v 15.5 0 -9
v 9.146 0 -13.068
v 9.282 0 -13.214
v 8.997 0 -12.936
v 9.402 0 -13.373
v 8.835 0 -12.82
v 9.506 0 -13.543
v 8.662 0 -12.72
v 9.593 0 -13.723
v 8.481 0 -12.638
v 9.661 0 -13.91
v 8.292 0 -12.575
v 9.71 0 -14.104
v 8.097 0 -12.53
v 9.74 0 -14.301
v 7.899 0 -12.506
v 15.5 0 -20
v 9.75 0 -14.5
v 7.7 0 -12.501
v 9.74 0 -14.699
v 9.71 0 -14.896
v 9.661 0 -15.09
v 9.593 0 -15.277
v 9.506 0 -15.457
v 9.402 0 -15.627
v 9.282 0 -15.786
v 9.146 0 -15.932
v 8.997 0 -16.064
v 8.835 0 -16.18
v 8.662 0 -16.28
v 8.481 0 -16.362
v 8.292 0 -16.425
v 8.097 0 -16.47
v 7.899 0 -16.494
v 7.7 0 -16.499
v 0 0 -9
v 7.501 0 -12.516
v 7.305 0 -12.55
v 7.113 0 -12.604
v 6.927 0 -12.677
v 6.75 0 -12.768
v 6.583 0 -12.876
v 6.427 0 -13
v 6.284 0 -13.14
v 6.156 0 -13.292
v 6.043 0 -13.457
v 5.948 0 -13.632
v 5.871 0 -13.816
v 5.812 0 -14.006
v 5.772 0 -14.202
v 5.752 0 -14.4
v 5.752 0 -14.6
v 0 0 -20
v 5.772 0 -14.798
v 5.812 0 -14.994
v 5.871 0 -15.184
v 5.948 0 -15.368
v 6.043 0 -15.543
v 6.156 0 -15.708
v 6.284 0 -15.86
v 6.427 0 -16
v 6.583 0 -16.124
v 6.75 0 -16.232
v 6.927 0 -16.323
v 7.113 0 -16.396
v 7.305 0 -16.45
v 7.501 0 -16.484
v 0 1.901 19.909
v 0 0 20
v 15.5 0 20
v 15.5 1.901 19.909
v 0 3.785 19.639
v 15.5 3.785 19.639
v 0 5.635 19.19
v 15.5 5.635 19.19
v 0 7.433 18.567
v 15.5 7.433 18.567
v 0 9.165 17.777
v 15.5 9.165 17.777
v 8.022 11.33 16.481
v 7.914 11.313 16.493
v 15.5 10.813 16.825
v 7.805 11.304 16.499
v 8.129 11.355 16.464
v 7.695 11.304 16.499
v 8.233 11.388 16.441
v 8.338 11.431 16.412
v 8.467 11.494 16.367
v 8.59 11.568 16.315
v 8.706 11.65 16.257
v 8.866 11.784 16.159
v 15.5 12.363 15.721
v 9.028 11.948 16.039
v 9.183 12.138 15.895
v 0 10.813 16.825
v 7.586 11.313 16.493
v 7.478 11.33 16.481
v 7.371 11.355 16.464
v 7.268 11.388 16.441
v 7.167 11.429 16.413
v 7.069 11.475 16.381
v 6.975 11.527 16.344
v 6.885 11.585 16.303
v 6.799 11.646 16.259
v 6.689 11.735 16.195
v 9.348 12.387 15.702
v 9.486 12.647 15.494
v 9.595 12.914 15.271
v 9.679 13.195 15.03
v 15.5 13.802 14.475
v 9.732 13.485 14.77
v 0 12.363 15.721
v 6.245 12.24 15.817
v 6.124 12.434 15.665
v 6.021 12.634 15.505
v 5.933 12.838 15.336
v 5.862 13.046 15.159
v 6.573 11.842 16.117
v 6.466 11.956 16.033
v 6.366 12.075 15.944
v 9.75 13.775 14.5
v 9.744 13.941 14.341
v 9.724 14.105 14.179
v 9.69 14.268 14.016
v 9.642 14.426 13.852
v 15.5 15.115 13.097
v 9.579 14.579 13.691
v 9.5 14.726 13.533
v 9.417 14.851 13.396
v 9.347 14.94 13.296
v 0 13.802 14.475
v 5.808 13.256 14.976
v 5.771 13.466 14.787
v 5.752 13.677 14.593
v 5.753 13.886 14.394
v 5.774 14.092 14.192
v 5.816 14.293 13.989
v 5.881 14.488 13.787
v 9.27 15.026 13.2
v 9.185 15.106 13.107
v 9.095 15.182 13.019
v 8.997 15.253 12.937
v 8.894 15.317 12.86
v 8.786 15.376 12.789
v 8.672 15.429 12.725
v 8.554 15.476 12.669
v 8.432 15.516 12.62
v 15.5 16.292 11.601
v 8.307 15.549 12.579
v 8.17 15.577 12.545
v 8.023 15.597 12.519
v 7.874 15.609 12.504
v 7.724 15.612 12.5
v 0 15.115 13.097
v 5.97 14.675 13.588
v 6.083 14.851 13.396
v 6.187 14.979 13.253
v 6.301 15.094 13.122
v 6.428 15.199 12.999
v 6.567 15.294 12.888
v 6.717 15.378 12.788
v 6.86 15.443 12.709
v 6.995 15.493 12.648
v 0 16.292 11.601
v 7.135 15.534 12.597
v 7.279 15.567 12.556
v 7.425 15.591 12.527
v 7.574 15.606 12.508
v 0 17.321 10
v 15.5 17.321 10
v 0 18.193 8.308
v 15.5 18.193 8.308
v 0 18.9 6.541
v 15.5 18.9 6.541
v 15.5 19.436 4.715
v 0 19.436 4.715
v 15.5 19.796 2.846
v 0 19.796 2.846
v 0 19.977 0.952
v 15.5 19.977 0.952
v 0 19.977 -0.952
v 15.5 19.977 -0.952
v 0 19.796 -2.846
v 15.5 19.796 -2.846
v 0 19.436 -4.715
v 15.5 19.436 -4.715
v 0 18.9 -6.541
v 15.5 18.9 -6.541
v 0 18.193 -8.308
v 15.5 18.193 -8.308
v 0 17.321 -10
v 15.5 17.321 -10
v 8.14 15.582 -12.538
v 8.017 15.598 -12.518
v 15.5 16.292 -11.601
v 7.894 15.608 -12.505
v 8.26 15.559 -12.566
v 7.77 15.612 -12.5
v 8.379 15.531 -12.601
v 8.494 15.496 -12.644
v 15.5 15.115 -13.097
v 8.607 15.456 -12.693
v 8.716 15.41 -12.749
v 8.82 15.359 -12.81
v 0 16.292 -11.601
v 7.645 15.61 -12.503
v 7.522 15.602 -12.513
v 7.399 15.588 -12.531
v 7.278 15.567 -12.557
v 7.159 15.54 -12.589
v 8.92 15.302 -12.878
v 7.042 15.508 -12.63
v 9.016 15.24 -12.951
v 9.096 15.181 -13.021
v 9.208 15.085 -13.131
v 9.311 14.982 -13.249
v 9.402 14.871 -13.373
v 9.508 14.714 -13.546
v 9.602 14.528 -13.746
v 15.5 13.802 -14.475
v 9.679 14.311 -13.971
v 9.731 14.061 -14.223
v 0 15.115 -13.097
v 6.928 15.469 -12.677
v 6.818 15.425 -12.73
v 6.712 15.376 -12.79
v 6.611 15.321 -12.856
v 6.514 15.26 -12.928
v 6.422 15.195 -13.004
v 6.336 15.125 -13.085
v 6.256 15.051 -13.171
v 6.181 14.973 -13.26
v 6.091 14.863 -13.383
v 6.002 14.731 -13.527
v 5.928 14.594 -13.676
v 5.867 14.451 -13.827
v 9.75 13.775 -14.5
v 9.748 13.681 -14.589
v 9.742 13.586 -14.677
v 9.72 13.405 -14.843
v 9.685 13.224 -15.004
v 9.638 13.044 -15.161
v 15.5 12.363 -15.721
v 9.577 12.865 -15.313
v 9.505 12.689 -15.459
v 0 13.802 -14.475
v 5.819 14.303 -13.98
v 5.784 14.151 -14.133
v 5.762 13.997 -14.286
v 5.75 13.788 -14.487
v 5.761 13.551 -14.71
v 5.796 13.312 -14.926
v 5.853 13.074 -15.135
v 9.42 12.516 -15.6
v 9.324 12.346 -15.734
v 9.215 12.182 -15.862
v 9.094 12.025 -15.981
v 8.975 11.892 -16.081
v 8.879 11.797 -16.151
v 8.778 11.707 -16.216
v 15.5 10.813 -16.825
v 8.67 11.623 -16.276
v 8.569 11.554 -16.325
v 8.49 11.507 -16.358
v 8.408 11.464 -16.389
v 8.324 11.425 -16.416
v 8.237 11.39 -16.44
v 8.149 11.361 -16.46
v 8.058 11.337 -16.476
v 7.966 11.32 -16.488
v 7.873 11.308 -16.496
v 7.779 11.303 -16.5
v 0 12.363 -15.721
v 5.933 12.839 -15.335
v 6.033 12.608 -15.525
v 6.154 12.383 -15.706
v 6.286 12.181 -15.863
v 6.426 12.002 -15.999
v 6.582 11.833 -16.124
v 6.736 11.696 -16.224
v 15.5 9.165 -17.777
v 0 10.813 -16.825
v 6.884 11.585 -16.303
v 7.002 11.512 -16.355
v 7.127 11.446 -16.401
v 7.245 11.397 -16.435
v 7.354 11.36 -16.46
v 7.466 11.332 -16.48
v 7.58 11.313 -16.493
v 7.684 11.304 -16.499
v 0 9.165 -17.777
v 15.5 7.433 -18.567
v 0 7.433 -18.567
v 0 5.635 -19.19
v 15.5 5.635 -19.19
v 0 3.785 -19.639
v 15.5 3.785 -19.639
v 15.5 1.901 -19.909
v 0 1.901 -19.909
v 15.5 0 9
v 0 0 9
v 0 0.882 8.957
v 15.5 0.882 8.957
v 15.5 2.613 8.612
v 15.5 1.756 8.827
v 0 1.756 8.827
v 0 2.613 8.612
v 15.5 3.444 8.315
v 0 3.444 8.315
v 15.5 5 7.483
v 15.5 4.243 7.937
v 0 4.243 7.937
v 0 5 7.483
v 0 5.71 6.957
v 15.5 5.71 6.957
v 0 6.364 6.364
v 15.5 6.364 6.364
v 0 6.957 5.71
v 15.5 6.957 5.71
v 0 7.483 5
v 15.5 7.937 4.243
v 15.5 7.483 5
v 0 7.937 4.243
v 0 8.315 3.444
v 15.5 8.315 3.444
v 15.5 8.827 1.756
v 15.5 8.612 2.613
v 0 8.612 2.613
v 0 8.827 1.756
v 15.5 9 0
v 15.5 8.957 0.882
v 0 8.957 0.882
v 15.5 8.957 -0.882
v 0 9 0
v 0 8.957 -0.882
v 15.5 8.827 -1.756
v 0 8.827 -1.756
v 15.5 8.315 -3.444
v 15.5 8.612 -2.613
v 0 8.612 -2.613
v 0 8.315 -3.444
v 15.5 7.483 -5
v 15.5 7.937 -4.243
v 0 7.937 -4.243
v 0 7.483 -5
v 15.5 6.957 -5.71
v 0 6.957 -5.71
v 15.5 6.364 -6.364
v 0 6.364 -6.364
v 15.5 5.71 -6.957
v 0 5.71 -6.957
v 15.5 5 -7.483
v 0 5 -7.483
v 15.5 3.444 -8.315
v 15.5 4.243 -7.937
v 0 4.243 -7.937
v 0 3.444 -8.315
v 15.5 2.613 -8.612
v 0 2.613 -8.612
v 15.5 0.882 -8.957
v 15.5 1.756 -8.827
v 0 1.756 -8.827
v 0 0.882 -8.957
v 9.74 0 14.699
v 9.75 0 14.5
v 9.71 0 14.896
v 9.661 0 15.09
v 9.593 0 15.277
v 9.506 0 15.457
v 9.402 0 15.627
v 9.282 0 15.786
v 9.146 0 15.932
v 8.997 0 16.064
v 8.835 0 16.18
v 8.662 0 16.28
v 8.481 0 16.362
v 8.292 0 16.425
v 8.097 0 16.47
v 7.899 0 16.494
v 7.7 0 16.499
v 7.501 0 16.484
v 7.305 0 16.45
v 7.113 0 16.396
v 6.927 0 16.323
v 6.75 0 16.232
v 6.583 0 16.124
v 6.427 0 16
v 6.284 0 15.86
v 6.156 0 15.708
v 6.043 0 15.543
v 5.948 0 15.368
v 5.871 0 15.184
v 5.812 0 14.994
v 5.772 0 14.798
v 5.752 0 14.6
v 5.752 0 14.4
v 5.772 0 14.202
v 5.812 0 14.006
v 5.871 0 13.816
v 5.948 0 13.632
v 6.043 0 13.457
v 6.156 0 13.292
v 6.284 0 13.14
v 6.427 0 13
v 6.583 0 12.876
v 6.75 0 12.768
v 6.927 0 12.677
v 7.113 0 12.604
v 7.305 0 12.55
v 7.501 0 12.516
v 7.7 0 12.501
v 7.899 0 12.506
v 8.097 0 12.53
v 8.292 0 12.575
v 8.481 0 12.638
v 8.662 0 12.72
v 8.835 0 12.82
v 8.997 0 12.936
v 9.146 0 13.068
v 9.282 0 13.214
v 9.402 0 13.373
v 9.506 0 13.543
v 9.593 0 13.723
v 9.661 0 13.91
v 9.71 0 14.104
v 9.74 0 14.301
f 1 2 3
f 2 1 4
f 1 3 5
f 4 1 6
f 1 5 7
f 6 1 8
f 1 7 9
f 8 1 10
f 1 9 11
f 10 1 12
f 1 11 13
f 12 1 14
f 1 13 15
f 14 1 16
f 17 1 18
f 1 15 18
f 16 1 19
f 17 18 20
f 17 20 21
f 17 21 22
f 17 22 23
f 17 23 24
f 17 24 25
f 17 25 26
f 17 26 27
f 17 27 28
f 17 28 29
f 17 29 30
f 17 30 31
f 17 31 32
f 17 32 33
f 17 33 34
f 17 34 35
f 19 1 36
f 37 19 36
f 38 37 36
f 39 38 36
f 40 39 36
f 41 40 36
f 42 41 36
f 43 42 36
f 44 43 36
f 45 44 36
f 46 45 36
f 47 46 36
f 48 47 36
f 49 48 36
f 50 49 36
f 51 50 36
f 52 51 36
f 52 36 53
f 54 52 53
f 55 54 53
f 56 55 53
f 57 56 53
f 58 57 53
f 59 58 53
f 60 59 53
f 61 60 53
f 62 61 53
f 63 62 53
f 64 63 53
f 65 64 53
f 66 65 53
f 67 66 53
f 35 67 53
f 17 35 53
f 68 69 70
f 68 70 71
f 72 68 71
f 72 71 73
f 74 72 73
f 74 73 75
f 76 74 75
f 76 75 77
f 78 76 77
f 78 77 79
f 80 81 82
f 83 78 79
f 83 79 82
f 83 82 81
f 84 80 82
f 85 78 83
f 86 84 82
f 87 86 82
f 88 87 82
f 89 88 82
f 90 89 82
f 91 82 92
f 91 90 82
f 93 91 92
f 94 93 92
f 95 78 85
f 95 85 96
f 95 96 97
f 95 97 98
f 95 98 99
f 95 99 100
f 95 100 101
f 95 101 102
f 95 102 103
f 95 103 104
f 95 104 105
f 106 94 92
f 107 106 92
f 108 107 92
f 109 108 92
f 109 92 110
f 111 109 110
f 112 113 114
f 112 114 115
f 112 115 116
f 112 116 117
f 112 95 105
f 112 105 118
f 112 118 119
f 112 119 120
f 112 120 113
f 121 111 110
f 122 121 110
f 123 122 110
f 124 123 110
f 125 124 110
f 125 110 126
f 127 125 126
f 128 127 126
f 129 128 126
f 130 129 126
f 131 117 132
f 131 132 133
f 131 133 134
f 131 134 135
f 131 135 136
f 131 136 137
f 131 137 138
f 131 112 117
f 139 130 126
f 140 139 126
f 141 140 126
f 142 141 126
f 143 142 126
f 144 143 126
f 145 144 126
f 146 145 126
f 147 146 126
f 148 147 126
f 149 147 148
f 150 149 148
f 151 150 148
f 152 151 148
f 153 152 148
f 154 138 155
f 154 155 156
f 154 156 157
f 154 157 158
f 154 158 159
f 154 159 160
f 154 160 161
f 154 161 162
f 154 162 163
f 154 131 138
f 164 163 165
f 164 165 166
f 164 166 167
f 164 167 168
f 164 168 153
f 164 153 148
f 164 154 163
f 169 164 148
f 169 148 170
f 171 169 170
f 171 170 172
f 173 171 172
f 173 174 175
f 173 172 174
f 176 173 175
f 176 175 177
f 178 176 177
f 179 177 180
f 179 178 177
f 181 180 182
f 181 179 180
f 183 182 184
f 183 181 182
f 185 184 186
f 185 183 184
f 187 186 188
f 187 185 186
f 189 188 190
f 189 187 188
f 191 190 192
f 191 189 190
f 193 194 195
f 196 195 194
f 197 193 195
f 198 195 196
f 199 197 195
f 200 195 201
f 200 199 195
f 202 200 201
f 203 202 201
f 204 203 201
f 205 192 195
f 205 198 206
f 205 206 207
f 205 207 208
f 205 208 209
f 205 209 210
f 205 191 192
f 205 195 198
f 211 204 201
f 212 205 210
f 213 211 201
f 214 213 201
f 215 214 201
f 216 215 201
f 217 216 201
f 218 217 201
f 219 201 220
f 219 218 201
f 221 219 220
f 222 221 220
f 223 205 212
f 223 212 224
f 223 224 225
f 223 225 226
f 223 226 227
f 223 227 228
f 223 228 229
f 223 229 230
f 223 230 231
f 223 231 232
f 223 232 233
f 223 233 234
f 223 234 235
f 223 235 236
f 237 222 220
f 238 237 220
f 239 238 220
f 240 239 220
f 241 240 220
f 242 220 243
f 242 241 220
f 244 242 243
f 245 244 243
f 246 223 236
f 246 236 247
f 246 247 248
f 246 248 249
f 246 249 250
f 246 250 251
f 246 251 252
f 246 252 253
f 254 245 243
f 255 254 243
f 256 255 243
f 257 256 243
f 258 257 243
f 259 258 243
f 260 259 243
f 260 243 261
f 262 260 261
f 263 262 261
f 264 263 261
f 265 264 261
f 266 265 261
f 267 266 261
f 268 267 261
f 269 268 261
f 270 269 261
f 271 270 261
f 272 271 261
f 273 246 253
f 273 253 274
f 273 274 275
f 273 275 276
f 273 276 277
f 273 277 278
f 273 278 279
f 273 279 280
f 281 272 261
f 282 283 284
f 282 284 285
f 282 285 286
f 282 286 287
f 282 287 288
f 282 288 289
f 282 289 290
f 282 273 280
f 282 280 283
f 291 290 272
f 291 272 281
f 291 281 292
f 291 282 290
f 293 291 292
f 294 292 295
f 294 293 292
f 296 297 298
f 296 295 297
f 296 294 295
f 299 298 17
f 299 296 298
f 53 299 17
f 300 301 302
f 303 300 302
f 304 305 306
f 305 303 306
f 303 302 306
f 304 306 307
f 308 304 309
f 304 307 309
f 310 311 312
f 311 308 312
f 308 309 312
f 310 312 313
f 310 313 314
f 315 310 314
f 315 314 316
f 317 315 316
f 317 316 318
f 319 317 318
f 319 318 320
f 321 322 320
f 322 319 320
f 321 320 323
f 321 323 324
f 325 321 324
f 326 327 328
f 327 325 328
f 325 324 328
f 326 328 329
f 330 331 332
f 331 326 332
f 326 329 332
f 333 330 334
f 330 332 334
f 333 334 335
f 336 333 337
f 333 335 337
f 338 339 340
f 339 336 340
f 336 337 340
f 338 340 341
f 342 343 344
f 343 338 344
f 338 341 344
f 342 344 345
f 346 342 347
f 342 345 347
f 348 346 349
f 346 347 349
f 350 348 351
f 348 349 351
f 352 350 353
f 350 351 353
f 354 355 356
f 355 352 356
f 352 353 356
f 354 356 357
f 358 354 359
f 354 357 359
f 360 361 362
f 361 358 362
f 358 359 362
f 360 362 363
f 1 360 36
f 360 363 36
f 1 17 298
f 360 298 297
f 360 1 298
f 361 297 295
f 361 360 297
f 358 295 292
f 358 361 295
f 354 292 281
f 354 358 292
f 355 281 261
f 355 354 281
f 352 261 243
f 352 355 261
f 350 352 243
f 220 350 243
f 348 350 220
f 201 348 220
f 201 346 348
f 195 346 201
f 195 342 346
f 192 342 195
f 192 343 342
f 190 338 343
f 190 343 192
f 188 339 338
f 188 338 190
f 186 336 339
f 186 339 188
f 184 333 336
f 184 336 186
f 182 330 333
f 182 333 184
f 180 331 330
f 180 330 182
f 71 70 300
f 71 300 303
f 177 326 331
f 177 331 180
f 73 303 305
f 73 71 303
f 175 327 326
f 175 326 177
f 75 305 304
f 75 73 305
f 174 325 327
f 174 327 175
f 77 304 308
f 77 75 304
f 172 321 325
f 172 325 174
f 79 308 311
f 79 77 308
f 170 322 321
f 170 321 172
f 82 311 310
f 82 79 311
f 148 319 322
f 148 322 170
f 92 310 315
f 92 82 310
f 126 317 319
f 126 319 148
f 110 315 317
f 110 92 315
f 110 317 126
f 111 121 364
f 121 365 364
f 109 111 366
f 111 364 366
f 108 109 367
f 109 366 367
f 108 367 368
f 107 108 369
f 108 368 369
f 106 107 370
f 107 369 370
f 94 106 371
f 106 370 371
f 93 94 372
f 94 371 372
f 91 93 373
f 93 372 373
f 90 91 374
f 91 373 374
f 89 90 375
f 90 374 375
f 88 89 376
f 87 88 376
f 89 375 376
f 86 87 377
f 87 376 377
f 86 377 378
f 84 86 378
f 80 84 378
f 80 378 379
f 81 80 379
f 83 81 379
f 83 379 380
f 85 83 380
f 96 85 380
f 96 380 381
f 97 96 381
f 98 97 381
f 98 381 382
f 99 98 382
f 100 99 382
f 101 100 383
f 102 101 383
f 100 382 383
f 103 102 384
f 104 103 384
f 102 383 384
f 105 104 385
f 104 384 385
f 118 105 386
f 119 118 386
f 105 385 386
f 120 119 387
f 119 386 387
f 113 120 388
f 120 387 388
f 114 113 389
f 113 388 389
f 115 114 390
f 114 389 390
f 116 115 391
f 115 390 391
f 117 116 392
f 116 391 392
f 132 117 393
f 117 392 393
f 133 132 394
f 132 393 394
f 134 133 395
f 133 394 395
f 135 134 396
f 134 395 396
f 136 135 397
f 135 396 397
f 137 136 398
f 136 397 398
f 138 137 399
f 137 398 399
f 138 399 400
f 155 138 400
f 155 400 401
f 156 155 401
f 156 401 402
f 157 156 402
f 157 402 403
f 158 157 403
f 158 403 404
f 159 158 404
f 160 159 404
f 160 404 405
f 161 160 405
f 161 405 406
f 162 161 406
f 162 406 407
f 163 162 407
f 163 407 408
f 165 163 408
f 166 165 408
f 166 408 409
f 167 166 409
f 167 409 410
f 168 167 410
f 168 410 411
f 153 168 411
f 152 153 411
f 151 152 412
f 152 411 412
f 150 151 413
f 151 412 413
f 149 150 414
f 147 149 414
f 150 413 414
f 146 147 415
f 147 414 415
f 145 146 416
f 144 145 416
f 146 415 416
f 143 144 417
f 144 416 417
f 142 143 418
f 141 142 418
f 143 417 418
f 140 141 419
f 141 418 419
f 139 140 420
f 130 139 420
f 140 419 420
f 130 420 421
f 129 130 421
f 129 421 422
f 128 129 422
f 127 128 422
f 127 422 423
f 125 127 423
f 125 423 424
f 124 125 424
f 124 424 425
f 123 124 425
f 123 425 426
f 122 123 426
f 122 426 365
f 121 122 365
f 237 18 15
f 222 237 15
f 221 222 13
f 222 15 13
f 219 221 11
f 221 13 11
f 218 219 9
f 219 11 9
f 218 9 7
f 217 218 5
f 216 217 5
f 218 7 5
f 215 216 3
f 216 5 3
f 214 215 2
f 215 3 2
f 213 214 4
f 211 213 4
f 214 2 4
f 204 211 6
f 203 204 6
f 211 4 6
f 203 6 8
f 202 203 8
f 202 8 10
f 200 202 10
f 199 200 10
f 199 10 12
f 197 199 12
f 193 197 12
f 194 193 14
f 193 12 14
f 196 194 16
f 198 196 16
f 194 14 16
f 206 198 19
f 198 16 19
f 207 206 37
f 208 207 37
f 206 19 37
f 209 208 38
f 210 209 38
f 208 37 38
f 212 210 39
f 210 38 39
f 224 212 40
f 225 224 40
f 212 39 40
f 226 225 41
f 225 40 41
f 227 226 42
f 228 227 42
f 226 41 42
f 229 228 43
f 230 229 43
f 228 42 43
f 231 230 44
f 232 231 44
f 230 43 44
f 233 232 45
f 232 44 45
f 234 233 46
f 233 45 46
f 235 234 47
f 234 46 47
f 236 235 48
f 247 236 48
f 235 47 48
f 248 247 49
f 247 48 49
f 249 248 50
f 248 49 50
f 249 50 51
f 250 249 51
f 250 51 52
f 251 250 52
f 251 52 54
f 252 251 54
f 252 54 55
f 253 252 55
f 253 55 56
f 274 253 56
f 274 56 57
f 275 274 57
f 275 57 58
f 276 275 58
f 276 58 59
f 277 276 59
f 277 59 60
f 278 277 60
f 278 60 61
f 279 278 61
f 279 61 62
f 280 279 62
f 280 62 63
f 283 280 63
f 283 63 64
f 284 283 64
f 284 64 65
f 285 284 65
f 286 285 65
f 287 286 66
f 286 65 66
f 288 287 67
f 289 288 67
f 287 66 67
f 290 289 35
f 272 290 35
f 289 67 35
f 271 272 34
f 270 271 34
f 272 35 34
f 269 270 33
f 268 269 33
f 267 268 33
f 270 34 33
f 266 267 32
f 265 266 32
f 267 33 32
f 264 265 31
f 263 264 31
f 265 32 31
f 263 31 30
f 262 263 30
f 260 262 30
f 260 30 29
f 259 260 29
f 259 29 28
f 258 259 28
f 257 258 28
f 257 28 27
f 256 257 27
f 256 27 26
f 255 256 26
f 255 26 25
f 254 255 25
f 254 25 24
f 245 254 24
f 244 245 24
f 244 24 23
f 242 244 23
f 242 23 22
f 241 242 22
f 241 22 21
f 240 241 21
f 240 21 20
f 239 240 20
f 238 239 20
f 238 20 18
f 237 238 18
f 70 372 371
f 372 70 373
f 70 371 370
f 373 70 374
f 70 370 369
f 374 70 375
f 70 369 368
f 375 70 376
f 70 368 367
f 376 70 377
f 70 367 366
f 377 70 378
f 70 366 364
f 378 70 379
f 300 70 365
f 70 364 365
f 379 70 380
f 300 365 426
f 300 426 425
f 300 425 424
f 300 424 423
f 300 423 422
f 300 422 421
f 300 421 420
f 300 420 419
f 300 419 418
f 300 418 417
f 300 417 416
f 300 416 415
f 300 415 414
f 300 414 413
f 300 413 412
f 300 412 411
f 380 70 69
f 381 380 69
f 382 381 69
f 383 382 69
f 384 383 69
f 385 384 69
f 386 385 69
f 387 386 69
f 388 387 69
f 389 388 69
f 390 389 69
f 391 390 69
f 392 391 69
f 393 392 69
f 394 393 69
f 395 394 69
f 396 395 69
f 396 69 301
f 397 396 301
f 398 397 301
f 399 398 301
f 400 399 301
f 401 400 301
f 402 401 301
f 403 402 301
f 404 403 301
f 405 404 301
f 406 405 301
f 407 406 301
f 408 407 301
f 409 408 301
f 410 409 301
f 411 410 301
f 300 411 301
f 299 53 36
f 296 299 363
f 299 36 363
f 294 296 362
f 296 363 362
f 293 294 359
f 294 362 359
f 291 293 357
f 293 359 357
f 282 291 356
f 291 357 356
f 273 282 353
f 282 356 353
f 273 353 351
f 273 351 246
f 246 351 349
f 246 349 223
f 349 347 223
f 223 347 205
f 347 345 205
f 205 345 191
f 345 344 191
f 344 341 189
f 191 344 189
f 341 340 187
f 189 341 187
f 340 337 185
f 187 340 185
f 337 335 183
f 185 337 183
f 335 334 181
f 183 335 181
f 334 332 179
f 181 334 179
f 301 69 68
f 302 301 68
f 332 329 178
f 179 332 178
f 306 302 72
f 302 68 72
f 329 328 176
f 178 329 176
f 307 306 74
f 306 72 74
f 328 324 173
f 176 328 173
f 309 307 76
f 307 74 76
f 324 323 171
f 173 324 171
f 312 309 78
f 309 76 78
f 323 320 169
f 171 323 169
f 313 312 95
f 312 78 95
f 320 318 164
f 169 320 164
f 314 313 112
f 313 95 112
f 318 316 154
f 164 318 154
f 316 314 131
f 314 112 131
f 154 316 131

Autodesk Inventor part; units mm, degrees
ref_plane "YZ Plane" through (0, 0, 0) normal (1, 0, 0) x (0, 1, 0)
ref_plane "XZ Plane" through (0, 0, 0) normal (0, 1, 0) x (-1, 0, 0)
sketch "Sketch1" plane through (0, 0, 0) normal (1, 0, 0) x (0, 1, 0)
  arc A0 (0, -20) -> (0, 20) centre (0, 0) ccw
  arc A1 (0, -9) -> (0, 9) centre (0, 0) ccw
  line L0 (0, 20) -> (0, 9)
  line L1 (0, -9) -> (0, -20)
  dimension "d0" = 18
  dimension "d1" = 40
  dimension "d10" = 11
  dimension "d11" = 11
extrude "Extrusion1" add sketch "Sketch1" along normal blind 15.5
ref_plane "Work Plane1" through (0, -20, 0) normal (0, -1, 0) x (1, 0, 0)
sketch "Sketch2" plane through (0, -20, 0) normal (0, -1, 0) x (1, 0, 0)
  line L0 (0, 20) -> (0, 9) projected
  line L1 (0, 9) -> (15.5, 9) projected
  line L2 (15.5, 20) -> (15.5, 9) projected
  line L3 (0, 20) -> (15.5, 20) projected
  line L4 (0, -9) -> (0, -20) projected
  line L5 (0, -20) -> (15.5, -20) projected
  line L6 (15.5, -9) -> (15.5, -20) projected
  line L7 (0, -9) -> (15.5, -9) projected
  circle A0 centre (7.75, 14.5) radius 2
  circle A1 centre (7.75, -14.5) radius 2
  line L8 (15.5, 14.5) -> (0, 14.5) construction
  line L9 (7.75, 9) -> (7.75, 20) construction
  line L10 (7.75, -9) -> (7.75, -20) construction
  line L11 (0, -14.5) -> (15.5, -14.5) construction
  point P0 (0, 0)
  dimension "d6" = 4
  dimension "d7" = 4
extrude "Extrusion2" cut sketch "Sketch2" against normal through all contours A0 | A1
equation "\"d7\" = d6"
